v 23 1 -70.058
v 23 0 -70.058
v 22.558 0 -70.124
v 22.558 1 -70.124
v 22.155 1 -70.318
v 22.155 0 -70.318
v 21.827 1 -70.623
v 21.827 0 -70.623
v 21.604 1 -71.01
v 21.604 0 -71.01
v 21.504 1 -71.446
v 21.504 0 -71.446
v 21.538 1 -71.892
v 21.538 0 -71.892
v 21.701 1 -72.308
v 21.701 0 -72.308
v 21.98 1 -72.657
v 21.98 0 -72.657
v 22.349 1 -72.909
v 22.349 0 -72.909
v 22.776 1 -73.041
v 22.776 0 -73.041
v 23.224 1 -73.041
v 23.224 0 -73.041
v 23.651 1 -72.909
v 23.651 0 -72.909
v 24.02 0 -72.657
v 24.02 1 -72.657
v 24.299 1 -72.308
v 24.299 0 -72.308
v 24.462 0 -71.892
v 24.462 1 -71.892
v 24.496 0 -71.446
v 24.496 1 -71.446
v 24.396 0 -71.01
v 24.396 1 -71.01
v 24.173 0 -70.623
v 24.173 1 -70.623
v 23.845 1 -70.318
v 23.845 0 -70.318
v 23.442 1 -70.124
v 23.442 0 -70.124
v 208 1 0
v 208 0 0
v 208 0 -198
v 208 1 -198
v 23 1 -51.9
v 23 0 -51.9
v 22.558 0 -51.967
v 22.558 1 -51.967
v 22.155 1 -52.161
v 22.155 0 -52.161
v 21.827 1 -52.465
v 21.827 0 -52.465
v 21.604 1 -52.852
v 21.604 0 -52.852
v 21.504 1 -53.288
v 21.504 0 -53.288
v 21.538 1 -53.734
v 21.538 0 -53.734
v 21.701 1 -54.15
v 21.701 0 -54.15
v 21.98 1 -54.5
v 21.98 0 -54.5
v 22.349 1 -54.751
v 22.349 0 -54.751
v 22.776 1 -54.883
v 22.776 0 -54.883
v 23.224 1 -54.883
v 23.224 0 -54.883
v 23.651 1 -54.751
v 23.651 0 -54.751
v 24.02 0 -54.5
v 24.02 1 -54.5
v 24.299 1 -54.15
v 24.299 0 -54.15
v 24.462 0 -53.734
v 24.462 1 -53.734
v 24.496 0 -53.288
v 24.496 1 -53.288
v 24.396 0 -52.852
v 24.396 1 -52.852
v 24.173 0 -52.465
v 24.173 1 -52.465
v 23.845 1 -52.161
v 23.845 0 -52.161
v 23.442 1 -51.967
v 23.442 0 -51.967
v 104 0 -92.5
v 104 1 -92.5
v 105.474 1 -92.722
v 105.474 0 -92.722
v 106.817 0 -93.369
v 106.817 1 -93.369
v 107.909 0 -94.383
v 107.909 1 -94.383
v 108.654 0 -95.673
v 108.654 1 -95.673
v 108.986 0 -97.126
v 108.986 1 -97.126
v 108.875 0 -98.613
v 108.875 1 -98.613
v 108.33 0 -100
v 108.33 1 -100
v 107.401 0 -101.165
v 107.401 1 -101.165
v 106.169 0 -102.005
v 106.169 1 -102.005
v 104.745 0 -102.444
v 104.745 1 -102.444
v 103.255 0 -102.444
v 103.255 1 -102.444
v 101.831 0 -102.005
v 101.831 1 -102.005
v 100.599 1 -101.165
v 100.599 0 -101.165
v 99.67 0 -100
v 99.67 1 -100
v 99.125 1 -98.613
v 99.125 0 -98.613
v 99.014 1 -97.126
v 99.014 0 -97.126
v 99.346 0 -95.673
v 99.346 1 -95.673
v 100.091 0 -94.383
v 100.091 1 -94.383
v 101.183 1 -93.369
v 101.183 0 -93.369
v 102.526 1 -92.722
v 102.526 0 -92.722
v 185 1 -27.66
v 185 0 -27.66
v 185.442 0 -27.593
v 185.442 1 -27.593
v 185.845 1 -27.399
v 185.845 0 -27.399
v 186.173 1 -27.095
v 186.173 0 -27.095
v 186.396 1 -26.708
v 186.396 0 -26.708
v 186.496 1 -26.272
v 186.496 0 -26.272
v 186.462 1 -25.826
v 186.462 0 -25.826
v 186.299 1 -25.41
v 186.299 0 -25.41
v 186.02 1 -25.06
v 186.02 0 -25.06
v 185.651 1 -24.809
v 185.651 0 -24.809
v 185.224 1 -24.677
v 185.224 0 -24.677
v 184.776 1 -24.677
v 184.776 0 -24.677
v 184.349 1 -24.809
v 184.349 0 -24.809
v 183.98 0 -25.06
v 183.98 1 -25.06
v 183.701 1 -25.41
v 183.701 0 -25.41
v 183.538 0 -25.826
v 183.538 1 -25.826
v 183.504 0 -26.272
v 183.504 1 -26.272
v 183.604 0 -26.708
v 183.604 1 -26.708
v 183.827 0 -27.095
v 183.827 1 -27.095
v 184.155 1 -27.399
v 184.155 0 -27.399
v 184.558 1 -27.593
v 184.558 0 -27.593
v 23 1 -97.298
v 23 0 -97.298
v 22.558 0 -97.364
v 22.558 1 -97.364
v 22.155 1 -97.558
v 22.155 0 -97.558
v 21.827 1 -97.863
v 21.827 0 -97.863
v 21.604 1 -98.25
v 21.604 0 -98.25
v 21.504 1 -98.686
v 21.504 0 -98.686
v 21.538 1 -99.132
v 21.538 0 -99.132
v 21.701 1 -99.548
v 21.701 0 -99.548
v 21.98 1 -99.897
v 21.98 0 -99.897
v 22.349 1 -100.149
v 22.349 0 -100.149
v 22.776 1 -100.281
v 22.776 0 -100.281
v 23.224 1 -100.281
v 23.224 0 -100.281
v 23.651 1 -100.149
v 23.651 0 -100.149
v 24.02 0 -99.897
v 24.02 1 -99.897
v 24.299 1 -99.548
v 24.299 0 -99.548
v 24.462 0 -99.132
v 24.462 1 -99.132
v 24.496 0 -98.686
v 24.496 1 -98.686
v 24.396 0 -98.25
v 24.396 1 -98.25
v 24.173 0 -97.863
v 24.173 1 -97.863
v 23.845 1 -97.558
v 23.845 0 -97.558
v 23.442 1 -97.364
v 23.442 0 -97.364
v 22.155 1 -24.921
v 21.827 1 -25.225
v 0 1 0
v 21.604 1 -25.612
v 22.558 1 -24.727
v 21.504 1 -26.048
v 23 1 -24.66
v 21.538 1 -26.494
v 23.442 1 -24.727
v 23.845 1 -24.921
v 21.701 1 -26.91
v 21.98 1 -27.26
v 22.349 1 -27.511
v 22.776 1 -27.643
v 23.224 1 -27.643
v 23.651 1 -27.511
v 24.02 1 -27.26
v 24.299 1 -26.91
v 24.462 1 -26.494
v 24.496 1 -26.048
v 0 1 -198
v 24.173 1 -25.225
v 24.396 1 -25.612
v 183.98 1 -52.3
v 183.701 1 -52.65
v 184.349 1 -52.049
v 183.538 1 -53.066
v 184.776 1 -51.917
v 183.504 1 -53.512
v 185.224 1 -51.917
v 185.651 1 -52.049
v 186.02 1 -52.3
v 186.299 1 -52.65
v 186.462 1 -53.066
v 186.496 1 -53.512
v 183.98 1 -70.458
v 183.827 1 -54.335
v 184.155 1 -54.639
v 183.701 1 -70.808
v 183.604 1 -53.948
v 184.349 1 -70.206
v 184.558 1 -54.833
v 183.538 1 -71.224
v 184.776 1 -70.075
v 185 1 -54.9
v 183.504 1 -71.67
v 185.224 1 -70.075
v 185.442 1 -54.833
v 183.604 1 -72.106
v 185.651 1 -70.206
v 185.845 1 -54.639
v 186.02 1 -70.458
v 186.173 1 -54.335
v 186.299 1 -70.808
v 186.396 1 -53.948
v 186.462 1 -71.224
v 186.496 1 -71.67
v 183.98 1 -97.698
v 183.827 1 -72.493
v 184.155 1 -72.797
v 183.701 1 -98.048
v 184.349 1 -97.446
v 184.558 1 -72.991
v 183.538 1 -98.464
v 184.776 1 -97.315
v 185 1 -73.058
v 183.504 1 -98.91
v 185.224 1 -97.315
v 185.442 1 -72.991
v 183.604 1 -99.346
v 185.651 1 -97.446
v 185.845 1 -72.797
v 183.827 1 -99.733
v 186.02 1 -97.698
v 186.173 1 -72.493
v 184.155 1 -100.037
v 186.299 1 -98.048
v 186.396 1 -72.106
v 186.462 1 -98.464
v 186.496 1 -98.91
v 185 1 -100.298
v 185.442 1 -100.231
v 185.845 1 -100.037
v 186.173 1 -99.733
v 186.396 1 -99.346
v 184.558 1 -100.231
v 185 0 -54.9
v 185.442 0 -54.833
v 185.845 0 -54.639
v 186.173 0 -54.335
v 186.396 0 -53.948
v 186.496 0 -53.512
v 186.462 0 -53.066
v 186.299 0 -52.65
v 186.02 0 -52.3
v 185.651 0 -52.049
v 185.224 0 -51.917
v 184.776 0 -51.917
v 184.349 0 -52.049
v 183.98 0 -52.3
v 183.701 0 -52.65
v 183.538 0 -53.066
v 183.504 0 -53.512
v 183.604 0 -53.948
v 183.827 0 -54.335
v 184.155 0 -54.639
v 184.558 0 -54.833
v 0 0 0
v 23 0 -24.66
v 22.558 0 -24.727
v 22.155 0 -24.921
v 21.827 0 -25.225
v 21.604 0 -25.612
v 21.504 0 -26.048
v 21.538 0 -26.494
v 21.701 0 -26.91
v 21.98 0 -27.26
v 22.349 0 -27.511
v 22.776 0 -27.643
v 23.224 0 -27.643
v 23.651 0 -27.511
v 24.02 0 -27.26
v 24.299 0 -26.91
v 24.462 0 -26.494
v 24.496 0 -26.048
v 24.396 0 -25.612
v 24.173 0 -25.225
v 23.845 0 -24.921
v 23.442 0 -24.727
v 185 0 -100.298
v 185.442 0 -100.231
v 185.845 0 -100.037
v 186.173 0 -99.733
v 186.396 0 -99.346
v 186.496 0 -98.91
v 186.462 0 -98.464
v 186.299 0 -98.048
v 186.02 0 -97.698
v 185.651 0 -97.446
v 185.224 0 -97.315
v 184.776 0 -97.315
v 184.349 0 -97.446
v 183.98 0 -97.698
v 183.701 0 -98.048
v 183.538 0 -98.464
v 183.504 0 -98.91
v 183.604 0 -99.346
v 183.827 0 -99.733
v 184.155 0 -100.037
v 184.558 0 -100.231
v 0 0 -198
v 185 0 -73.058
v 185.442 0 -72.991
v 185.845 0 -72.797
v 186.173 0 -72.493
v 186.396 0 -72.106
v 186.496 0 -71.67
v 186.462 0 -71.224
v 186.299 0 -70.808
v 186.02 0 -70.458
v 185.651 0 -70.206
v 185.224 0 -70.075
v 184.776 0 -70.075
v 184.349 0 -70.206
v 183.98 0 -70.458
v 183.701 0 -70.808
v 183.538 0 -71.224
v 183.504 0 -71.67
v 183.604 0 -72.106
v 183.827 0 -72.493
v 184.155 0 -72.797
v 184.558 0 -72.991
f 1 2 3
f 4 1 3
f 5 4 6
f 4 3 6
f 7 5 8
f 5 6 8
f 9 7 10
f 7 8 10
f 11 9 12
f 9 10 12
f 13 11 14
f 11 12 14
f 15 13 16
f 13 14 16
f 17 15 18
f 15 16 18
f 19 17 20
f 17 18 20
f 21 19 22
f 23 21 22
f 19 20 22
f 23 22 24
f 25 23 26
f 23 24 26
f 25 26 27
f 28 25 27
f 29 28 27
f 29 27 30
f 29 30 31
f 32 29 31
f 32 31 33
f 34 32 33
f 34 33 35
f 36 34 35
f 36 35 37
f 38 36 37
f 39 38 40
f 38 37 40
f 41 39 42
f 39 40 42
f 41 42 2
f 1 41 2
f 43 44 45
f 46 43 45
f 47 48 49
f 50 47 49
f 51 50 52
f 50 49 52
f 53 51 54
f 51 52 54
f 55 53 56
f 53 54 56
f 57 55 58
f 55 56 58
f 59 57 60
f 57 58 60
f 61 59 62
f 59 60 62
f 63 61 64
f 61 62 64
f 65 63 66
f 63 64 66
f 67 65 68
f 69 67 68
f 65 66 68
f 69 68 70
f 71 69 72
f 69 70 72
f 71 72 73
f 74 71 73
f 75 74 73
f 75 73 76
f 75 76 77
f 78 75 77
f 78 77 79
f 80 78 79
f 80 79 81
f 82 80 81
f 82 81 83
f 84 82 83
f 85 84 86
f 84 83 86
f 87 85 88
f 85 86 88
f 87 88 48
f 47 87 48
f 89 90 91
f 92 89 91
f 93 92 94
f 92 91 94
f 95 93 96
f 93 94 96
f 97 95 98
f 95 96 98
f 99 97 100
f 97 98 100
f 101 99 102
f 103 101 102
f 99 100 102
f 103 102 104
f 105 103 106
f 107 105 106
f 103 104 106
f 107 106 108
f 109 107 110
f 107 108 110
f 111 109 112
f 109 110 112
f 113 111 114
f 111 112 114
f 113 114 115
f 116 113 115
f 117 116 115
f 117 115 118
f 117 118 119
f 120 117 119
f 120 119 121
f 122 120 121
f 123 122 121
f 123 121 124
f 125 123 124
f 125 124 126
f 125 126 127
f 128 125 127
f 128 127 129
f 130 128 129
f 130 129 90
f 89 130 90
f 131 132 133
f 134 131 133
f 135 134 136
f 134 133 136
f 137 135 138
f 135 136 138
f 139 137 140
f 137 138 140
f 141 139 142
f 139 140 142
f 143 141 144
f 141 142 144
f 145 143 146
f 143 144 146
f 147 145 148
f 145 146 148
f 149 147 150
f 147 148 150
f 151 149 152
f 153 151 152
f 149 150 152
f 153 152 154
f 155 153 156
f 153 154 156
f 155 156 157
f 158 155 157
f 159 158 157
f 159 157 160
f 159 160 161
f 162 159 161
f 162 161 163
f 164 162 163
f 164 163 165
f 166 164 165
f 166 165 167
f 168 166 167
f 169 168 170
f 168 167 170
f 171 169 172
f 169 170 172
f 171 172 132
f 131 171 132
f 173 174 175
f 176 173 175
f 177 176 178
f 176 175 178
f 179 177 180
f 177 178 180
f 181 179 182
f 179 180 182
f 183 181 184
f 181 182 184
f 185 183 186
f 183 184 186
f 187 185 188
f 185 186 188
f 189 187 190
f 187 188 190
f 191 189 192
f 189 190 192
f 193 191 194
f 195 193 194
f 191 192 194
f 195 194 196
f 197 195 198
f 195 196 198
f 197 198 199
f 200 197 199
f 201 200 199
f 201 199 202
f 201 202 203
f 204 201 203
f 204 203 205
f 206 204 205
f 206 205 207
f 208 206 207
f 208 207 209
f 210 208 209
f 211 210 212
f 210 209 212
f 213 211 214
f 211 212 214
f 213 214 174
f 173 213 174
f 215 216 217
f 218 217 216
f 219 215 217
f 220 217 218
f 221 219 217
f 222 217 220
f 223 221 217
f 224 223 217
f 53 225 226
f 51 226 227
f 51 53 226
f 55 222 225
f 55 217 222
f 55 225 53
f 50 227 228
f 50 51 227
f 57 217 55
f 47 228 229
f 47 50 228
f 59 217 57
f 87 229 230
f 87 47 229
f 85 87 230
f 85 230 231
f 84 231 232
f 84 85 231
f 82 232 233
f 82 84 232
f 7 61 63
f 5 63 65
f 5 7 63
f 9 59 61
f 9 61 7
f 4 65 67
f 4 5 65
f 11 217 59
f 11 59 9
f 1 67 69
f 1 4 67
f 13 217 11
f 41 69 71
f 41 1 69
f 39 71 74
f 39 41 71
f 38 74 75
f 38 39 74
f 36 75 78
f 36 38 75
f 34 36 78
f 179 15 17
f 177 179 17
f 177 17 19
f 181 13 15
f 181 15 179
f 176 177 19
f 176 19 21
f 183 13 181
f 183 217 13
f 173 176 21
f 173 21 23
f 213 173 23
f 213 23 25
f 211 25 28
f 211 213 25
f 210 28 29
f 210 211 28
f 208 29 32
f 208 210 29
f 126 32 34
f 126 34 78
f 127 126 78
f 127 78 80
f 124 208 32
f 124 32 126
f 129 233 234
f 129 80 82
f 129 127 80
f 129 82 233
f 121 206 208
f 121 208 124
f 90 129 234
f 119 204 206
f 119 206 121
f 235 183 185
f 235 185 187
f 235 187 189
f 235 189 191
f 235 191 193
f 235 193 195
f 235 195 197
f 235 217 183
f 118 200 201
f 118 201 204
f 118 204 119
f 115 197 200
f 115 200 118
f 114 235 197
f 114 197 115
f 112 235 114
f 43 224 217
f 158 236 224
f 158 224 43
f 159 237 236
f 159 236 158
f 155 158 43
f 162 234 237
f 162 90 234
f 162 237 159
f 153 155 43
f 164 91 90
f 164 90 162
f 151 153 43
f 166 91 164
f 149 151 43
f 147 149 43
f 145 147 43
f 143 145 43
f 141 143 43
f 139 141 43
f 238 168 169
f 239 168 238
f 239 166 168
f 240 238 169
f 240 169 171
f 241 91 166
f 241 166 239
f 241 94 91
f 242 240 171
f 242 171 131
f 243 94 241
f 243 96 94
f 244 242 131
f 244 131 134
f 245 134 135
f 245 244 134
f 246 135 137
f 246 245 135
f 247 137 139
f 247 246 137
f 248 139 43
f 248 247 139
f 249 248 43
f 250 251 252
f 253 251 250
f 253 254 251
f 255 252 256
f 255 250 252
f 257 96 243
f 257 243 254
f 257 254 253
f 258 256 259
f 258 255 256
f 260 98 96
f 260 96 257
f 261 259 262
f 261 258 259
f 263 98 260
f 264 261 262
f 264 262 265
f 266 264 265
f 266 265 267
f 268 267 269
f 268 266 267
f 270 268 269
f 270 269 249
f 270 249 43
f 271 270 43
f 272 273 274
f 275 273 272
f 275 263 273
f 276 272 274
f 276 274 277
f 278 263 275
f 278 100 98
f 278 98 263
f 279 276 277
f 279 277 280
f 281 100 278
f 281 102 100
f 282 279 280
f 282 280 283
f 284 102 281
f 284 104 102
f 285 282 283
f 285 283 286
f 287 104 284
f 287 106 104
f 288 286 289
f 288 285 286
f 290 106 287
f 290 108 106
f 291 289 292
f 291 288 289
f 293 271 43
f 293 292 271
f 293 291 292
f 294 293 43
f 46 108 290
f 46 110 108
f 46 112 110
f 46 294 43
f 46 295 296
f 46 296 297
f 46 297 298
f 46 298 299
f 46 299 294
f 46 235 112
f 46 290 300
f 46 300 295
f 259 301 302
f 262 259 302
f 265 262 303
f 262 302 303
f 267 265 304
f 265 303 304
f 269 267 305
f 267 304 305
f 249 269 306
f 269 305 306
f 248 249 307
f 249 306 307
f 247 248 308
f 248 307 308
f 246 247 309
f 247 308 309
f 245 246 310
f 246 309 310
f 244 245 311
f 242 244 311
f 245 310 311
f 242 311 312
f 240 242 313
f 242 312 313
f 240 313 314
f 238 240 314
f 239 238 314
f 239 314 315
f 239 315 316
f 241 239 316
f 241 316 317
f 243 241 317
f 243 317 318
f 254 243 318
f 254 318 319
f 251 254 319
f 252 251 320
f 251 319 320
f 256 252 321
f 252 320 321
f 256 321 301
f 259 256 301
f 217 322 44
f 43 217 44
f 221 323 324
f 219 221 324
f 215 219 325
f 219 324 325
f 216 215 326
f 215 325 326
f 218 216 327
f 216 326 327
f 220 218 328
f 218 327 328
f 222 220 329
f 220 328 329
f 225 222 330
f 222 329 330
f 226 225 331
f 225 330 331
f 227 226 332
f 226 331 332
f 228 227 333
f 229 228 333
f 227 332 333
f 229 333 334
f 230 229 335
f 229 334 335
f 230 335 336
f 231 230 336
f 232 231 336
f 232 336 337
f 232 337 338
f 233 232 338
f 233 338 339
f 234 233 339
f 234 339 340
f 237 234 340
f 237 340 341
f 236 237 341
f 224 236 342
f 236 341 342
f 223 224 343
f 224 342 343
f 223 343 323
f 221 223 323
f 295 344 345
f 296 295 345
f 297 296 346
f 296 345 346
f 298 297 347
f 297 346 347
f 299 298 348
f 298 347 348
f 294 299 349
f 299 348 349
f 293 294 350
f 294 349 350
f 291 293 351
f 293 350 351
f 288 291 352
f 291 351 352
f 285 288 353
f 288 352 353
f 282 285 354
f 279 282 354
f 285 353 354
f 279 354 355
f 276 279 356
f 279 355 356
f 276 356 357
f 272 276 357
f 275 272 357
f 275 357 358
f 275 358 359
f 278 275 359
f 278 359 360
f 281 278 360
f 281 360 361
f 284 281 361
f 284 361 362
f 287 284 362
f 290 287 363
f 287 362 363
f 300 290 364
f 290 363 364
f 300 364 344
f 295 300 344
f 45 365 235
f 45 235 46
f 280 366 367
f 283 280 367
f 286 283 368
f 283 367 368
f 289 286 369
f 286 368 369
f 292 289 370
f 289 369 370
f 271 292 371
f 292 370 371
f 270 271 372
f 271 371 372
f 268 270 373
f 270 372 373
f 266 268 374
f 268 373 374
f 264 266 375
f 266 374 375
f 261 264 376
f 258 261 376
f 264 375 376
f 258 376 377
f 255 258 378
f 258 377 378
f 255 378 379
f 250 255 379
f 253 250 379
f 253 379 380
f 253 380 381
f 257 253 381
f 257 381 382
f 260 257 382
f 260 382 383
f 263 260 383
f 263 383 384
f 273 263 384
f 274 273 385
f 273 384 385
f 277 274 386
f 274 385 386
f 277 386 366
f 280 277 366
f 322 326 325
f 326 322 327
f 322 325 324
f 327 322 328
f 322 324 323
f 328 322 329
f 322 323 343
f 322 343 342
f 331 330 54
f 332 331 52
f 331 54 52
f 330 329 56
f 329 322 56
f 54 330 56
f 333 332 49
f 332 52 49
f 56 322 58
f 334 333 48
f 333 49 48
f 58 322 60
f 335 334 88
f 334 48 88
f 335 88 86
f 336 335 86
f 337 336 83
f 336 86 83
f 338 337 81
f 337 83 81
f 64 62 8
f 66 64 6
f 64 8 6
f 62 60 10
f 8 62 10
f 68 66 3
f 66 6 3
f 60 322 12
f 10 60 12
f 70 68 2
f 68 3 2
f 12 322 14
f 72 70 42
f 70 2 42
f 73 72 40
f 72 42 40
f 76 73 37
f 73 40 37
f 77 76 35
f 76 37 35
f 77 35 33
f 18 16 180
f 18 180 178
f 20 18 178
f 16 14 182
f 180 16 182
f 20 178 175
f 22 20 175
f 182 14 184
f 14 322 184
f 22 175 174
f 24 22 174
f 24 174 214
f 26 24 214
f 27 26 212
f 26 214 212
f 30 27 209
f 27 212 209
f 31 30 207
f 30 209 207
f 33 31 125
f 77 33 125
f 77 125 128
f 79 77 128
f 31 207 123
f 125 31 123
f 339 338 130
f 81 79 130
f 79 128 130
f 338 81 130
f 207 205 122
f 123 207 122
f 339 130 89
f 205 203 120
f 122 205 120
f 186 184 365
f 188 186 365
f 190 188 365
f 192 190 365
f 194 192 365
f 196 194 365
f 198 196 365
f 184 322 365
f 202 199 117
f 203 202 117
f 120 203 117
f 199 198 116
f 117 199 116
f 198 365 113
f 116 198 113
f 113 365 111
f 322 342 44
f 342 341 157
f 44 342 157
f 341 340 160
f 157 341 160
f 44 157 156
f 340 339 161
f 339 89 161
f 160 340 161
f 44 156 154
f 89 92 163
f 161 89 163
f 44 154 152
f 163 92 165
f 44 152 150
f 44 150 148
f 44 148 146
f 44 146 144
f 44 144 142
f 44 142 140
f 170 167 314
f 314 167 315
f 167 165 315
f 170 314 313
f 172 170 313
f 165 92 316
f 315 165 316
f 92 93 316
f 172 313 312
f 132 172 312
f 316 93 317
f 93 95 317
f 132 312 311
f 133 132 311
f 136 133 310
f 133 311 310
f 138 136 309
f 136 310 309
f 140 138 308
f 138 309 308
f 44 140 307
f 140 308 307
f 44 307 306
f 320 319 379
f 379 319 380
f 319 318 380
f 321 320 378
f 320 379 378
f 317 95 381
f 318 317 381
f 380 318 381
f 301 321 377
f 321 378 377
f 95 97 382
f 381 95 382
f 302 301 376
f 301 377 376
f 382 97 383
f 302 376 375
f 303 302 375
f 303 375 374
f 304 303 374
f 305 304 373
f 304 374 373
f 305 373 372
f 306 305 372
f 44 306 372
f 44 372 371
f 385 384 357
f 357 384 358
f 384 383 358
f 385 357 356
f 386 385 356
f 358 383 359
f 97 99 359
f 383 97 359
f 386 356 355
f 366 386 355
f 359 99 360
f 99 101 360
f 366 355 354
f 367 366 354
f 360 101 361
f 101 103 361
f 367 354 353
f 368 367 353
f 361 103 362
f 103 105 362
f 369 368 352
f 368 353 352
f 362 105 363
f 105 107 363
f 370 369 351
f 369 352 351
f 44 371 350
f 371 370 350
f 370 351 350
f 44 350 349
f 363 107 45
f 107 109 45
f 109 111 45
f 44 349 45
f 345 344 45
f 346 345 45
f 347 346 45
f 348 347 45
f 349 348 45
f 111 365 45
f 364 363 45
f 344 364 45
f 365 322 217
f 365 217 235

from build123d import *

# Parameters (mm, degrees)
SKETCH1_W           = 208
SKETCH1_H           = 198
BOSS_EXTRUDE1_DEPTH = 1
INPUT_FOR_SPEAKER_R = 5
CUT_EXTRUDE1_DEPTH  = 10
SKETCH4_R           = 1.5
CUT_EXTRUDE2_DEPTH  = 1


with BuildPart() as part:
    # Sketch1 → Boss-Extrude1 (new body)
    with BuildSketch(Plane(origin=(0, 0, 0), x_dir=(1, 0, 0), z_dir=(0, 1, 0))):
        with Locations((104, 99)):
            Rectangle(SKETCH1_W, SKETCH1_H)
    extrude(amount=BOSS_EXTRUDE1_DEPTH)

    # Input for speaker → Cut-Extrude1 (cut)
    with BuildSketch(Plane(origin=(0, 1, 0), x_dir=(1, 0, 0), z_dir=(0, 1, 0))):
        with Locations(Location((104, 97.5, 0), (0, 0, 270))):
            Circle(INPUT_FOR_SPEAKER_R)
    extrude(amount=-CUT_EXTRUDE1_DEPTH, mode=Mode.SUBTRACT)

    # Sketch4 → Cut-Extrude2 (cut)
    with BuildSketch(Plane(origin=(0, 0, 0), x_dir=(-1, 0, 0), z_dir=(0, -1, 0))):
        with Locations(Location((-185, 98.797761971, 0), (0, 0, 90))):
            Circle(SKETCH4_R)
        with Locations(Location((-185, 71.557761971, 0), (0, 0, 90))):
            Circle(SKETCH4_R)
        with Locations(Location((-185, 53.4, 0), (0, 0, 90))):
            Circle(SKETCH4_R)
        with Locations(Location((-185, 26.16, 0), (0, 0, 90))):
            Circle(SKETCH4_R)
        with Locations(Location((-23, 26.16, 0), (0, 0, 270))):
            Circle(SKETCH4_R)
        with Locations(Location((-23, 53.4, 0), (0, 0, 270))):
            Circle(SKETCH4_R)
        with Locations(Location((-23, 71.557761971, 0), (0, 0, 270))):
            Circle(SKETCH4_R)
        with Locations(Location((-23, 98.797761971, 0), (0, 0, 270))):
            Circle(SKETCH4_R)
    extrude(amount=-CUT_EXTRUDE2_DEPTH, mode=Mode.SUBTRACT)


solid = part.part
